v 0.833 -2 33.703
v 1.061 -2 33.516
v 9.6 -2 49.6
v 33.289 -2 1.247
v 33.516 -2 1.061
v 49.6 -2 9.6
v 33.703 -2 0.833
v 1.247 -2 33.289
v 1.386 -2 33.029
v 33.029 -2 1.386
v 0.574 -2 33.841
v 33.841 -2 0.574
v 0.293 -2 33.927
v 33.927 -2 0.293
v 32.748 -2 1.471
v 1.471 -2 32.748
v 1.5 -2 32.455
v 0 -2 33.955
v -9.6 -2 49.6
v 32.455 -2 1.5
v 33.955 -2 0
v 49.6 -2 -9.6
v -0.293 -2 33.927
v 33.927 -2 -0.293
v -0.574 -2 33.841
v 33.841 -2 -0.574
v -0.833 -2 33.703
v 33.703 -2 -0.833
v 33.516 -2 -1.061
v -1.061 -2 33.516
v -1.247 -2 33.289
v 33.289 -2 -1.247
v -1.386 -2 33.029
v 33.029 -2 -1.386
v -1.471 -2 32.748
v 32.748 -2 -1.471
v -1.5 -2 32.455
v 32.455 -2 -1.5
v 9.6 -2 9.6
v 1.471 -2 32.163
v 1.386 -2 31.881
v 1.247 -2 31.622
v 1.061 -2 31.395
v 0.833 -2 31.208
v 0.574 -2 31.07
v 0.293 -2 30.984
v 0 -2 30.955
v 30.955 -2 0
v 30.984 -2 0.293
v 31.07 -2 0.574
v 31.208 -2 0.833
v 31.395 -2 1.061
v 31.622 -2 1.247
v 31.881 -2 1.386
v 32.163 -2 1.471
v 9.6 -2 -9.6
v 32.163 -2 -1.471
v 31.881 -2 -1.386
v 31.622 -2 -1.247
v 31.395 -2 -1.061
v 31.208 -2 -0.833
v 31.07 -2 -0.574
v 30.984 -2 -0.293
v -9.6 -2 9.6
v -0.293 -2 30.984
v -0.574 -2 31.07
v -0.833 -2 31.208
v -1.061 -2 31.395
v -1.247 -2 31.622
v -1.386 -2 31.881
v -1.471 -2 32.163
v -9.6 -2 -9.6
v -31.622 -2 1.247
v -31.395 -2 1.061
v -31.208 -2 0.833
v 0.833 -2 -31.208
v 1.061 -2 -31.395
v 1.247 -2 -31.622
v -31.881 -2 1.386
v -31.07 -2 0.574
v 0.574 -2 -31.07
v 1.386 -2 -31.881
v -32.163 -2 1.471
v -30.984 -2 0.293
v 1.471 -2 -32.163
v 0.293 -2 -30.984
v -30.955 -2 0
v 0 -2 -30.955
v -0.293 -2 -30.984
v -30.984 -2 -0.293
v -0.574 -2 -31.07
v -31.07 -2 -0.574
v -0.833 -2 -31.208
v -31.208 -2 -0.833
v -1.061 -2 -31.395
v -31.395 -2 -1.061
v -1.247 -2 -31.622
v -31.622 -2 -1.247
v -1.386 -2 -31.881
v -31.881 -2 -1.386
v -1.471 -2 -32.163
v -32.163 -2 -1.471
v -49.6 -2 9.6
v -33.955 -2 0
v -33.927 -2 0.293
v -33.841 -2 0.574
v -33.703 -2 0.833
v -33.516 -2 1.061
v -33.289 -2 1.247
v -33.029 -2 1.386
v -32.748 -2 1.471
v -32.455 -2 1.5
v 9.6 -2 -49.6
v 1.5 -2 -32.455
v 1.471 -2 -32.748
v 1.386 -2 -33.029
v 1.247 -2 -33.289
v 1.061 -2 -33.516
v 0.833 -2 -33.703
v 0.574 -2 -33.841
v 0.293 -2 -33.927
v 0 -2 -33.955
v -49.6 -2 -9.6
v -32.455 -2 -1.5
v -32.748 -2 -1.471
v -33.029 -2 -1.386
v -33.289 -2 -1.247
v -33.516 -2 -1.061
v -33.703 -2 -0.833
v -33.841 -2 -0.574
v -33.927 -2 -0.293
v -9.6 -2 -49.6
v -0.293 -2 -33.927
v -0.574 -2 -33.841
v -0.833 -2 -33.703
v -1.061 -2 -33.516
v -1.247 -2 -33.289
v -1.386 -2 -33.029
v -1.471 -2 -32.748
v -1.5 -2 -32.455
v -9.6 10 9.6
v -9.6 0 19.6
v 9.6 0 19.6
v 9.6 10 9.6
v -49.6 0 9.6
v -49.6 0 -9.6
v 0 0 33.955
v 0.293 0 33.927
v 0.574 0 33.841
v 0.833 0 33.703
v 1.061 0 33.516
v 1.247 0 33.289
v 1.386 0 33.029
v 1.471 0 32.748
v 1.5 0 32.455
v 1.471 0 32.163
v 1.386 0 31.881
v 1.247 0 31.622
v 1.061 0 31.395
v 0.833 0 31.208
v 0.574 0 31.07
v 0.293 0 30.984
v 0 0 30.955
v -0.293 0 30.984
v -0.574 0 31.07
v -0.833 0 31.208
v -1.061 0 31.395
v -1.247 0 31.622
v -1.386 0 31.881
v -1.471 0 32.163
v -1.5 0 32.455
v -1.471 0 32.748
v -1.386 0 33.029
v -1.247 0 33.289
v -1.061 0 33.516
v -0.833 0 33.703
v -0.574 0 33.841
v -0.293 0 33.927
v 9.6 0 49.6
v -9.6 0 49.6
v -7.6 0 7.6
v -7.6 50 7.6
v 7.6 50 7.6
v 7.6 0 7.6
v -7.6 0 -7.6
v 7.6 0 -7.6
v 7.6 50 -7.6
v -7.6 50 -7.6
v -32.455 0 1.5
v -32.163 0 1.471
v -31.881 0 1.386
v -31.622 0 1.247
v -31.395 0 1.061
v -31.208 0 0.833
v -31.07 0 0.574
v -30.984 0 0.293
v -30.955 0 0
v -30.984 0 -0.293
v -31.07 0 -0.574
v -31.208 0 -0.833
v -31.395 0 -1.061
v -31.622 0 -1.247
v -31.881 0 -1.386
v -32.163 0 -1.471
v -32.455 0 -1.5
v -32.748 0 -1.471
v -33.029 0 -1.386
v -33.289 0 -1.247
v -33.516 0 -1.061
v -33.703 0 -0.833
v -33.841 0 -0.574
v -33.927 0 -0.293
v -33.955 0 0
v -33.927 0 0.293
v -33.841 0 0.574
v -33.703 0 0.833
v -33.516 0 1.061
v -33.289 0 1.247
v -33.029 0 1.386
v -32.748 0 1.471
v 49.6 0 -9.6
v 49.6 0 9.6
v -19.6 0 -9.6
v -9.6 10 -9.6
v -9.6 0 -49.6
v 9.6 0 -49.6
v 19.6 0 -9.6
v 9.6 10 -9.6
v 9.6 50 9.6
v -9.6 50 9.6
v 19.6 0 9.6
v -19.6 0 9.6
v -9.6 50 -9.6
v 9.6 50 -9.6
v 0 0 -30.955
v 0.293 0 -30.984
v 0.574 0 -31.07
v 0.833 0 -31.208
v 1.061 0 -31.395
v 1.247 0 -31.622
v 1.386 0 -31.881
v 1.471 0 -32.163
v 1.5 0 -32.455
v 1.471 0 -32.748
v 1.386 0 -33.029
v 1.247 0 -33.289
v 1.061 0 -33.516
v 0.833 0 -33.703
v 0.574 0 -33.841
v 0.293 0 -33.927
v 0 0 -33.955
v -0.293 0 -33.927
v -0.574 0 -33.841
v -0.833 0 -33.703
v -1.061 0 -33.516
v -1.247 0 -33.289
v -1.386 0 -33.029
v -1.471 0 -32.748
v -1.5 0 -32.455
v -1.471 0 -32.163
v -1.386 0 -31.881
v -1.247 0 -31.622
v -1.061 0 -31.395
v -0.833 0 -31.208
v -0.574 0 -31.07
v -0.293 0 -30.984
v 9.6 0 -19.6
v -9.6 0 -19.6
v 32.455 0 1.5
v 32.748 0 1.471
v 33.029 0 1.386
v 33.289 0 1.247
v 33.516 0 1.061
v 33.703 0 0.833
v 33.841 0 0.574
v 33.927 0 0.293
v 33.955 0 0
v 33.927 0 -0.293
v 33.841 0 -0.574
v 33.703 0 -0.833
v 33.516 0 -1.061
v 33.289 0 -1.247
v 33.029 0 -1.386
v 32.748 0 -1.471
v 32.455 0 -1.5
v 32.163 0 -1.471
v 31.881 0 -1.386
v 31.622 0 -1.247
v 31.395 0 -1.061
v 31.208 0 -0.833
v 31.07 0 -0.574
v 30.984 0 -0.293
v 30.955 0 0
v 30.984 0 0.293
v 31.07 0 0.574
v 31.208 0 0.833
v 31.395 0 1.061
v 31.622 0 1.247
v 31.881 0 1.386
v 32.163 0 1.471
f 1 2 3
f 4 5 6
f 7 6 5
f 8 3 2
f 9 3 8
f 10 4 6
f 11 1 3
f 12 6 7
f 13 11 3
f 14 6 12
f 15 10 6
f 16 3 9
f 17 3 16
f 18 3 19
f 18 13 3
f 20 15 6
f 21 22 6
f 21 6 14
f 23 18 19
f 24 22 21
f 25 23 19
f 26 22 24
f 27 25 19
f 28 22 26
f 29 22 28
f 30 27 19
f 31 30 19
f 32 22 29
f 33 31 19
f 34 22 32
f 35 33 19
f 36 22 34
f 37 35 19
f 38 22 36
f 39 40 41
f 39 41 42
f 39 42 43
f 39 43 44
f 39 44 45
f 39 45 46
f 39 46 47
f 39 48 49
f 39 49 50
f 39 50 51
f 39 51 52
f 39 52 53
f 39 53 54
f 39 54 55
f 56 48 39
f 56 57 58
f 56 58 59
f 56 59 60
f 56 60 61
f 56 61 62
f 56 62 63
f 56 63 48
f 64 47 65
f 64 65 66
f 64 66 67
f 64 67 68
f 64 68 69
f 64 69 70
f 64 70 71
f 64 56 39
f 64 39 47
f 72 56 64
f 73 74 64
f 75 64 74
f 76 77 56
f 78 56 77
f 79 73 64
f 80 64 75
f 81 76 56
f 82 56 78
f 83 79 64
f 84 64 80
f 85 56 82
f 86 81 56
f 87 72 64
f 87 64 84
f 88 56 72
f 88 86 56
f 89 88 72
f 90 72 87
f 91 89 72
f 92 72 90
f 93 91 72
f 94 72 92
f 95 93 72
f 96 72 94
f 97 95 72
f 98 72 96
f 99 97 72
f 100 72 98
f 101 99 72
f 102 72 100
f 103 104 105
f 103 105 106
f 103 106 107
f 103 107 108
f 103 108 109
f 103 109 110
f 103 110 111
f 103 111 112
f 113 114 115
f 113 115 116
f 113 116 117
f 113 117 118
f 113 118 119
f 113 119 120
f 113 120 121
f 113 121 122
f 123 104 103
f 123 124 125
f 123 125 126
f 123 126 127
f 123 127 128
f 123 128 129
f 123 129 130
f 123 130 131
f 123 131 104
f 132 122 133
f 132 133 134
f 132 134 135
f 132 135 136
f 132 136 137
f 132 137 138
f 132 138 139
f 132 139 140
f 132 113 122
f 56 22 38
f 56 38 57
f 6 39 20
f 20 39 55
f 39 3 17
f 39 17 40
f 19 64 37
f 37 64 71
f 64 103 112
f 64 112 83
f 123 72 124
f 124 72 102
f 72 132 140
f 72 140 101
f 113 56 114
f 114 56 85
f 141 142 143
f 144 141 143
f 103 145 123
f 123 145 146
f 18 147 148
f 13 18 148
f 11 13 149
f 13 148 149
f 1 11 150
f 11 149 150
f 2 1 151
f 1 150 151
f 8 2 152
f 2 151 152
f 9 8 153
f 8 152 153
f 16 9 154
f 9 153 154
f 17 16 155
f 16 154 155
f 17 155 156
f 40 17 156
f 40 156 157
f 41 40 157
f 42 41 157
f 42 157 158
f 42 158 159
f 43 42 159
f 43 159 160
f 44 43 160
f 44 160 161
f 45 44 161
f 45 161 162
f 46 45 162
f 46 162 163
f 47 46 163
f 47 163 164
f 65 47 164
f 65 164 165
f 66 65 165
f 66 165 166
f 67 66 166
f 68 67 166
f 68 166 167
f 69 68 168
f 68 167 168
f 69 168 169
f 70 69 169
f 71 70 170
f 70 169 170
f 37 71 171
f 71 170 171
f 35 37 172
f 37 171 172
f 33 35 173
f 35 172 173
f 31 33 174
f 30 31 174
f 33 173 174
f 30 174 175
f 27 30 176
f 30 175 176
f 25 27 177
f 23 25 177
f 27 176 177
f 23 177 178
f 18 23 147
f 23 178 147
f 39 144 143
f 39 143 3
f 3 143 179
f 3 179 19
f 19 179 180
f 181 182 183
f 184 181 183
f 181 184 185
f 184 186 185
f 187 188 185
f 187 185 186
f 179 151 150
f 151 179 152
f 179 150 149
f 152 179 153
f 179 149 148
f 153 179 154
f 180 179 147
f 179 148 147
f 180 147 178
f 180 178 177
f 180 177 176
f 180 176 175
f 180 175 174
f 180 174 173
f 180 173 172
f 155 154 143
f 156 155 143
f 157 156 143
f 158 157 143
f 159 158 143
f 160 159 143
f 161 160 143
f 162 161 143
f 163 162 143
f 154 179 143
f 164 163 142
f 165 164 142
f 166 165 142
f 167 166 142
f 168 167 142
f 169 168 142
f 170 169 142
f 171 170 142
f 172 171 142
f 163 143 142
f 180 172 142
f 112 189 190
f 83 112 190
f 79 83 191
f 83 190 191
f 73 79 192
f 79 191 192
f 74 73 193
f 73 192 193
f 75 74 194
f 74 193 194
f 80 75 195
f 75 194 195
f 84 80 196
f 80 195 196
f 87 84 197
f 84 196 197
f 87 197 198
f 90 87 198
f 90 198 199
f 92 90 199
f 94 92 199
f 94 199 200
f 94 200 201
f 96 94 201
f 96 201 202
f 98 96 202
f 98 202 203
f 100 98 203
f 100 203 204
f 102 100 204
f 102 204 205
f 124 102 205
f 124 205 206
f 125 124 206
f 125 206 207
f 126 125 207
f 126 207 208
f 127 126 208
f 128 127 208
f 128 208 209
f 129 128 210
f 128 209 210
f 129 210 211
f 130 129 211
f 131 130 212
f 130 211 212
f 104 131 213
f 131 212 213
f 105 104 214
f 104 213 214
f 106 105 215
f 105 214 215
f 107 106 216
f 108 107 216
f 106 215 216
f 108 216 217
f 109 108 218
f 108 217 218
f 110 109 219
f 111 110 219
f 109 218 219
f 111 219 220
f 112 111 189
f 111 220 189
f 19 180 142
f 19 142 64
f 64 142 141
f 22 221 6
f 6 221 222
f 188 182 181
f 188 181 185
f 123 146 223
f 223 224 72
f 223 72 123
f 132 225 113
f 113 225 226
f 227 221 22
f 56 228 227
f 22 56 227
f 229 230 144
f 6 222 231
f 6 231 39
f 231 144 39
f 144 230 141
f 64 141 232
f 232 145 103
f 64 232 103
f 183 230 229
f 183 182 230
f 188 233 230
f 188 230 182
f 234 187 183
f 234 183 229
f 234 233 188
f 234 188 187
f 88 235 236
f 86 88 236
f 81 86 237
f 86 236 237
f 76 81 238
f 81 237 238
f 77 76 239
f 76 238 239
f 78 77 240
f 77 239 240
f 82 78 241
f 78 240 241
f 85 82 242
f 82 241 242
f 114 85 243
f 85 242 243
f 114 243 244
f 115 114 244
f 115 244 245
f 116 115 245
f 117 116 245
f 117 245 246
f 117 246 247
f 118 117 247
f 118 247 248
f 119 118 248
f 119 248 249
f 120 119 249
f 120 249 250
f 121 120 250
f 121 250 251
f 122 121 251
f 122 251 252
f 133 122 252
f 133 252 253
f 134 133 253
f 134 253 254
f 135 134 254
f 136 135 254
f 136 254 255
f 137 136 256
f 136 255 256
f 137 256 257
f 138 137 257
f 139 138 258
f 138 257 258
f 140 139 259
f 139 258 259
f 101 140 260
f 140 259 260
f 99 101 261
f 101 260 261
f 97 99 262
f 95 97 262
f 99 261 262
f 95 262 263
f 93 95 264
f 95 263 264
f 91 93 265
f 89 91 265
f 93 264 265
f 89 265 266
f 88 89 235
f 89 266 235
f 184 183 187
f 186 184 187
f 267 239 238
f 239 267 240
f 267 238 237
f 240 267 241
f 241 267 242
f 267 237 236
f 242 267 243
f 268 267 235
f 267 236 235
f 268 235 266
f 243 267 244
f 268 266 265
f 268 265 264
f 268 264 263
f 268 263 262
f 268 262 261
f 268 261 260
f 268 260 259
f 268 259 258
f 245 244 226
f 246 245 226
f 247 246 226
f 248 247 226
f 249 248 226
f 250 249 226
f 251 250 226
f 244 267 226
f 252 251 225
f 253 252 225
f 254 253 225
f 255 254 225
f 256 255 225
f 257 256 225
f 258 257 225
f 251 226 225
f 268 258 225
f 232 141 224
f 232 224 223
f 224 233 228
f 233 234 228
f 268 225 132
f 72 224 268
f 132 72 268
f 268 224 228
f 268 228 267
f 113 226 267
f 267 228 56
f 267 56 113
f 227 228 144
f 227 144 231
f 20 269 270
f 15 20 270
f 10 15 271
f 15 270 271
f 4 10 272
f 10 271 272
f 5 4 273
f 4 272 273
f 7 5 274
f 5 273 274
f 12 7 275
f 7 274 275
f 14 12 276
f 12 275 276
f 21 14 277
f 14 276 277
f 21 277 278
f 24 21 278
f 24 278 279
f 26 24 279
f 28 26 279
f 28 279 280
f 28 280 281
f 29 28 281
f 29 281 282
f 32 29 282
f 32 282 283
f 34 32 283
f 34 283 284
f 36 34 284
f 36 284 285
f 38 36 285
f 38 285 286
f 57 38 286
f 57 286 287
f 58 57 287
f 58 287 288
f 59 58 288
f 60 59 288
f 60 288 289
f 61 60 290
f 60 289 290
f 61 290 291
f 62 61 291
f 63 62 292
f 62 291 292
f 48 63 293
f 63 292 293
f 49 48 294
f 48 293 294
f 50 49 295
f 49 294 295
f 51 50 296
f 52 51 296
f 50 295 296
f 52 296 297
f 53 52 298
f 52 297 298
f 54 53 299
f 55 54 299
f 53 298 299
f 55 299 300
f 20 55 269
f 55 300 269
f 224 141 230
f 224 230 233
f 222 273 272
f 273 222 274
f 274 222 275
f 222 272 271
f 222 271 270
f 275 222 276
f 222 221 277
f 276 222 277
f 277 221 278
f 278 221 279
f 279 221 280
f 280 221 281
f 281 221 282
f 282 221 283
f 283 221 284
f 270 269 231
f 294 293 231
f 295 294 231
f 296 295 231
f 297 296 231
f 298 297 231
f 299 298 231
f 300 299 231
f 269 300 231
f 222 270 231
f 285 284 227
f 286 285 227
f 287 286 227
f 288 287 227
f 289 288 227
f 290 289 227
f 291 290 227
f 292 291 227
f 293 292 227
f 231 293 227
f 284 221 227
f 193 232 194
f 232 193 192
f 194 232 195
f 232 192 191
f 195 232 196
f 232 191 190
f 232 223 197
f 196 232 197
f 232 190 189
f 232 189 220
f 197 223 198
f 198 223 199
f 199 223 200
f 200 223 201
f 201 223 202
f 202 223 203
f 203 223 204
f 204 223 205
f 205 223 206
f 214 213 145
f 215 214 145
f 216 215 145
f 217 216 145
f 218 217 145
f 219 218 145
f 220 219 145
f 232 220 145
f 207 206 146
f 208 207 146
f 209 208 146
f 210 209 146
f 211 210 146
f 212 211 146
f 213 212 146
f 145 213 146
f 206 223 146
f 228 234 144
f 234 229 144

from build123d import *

# Parameters (mm, degrees)
SKETCH1_W           = 19.2
SKETCH1_H           = 19.2
SKETCH1_W_2         = 15.2
SKETCH1_H_2         = 15.2
EXTRUDE_THIN1_DEPTH = 50
BOSS_EXTRUDE1_DEPTH = 2
CHAMFER1_SIZE       = 10
CHAMFER2_SIZE       = 10
CHAMFER3_SIZE       = 10
CHAMFER4_SIZE       = 10
SKETCH6_R           = 1.5
CUT_EXTRUDE1_DEPTH  = 87.141279303


# Some blends are built 0.0001 mm under size
with BuildPart() as part:
    # Sketch1 → Extrude-Thin1 (new body)
    with BuildSketch(Plane(origin=(0, 0, 0), x_dir=(1, 0, 0), z_dir=(0, 1, 0))):
        Rectangle(SKETCH1_W, SKETCH1_H)
        Rectangle(SKETCH1_W_2, SKETCH1_H_2, mode=Mode.SUBTRACT)
    extrude(amount=EXTRUDE_THIN1_DEPTH)

    # Sketch2 → Boss-Extrude1 (add)
    with BuildSketch(Plane(origin=(0, 0, 0), x_dir=(1, 0, 0), z_dir=(0, 1, 0))):
        Polygon((9.6, 9.6), (49.6, 9.6), (49.6, -9.6), (9.6, -9.6), (9.6, -49.6), (-9.6, -49.6), (-9.6, -9.6), (-49.6, -9.6), (-49.6, 9.6), (-9.6, 9.6), (-9.6, 49.6), (9.6, 49.6), align=None)
    extrude(amount=-BOSS_EXTRUDE1_DEPTH)

    # Chamfer1
    # the kernel refuses this chamfer: 10 mm, written as the material it adds along each edge
    with BuildSketch(Plane(origin=(-9.6, 0, 9.6), x_dir=(0, 1, 0), z_dir=(0, 0, -1))) as chamfer1_piece_1:
        Polygon((CHAMFER1_SIZE, 0), (0, -CHAMFER1_SIZE), (0, 0), align=None)
    extrude(amount=19.2)

    # Chamfer2
    # the kernel refuses this chamfer: 10 mm, written as the material it adds along each edge
    with BuildSketch(Plane(origin=(-9.6, 0, -9.6), x_dir=(0, 1, 0), z_dir=(1, 0, 0))) as chamfer2_piece_1:
        Polygon((CHAMFER2_SIZE, 0), (0, -CHAMFER2_SIZE), (0, 0), align=None)
    extrude(amount=19.2)

    # Chamfer3
    # the kernel refuses this chamfer: 10 mm, written as the material it adds along each edge
    with BuildSketch(Plane(origin=(9.6, 0, -9.6), x_dir=(0, 1, 0), z_dir=(0, 0, 1))) as chamfer3_piece_1:
        Polygon((CHAMFER3_SIZE, 0), (0, -CHAMFER3_SIZE), (0, 0), align=None)
    extrude(amount=19.2)

    # Chamfer4
    chamfer4_edges = [part.edges().sort_by_distance(p)[0] for p in [
        (0, 0, 9.6),
    ]]
    chamfer(chamfer4_edges, length=CHAMFER4_SIZE - 0.0001)  # a hair under: the kernel refuses the full size

    # Sketch6 → Cut-Extrude1 (cut, through all)
    with BuildSketch(Plane(origin=(0, 0, 0), x_dir=(1, 0, 0), z_dir=(0, 1, 0))):
        with Locations(Location((0, 32.455385939, 0), (0, 0, 270))):
            Circle(SKETCH6_R)
        with Locations(Location((32.455385939, 0, 0), (0, 0, 270))):
            Circle(SKETCH6_R)
        with Locations(Location((0, -32.455385939, 0), (0, 0, 270))):
            Circle(SKETCH6_R)
        with Locations(Location((-32.455385939, 0, 0), (0, 0, 270))):
            Circle(SKETCH6_R)
    extrude(amount=-CUT_EXTRUDE1_DEPTH, mode=Mode.SUBTRACT)


solid = part.part
